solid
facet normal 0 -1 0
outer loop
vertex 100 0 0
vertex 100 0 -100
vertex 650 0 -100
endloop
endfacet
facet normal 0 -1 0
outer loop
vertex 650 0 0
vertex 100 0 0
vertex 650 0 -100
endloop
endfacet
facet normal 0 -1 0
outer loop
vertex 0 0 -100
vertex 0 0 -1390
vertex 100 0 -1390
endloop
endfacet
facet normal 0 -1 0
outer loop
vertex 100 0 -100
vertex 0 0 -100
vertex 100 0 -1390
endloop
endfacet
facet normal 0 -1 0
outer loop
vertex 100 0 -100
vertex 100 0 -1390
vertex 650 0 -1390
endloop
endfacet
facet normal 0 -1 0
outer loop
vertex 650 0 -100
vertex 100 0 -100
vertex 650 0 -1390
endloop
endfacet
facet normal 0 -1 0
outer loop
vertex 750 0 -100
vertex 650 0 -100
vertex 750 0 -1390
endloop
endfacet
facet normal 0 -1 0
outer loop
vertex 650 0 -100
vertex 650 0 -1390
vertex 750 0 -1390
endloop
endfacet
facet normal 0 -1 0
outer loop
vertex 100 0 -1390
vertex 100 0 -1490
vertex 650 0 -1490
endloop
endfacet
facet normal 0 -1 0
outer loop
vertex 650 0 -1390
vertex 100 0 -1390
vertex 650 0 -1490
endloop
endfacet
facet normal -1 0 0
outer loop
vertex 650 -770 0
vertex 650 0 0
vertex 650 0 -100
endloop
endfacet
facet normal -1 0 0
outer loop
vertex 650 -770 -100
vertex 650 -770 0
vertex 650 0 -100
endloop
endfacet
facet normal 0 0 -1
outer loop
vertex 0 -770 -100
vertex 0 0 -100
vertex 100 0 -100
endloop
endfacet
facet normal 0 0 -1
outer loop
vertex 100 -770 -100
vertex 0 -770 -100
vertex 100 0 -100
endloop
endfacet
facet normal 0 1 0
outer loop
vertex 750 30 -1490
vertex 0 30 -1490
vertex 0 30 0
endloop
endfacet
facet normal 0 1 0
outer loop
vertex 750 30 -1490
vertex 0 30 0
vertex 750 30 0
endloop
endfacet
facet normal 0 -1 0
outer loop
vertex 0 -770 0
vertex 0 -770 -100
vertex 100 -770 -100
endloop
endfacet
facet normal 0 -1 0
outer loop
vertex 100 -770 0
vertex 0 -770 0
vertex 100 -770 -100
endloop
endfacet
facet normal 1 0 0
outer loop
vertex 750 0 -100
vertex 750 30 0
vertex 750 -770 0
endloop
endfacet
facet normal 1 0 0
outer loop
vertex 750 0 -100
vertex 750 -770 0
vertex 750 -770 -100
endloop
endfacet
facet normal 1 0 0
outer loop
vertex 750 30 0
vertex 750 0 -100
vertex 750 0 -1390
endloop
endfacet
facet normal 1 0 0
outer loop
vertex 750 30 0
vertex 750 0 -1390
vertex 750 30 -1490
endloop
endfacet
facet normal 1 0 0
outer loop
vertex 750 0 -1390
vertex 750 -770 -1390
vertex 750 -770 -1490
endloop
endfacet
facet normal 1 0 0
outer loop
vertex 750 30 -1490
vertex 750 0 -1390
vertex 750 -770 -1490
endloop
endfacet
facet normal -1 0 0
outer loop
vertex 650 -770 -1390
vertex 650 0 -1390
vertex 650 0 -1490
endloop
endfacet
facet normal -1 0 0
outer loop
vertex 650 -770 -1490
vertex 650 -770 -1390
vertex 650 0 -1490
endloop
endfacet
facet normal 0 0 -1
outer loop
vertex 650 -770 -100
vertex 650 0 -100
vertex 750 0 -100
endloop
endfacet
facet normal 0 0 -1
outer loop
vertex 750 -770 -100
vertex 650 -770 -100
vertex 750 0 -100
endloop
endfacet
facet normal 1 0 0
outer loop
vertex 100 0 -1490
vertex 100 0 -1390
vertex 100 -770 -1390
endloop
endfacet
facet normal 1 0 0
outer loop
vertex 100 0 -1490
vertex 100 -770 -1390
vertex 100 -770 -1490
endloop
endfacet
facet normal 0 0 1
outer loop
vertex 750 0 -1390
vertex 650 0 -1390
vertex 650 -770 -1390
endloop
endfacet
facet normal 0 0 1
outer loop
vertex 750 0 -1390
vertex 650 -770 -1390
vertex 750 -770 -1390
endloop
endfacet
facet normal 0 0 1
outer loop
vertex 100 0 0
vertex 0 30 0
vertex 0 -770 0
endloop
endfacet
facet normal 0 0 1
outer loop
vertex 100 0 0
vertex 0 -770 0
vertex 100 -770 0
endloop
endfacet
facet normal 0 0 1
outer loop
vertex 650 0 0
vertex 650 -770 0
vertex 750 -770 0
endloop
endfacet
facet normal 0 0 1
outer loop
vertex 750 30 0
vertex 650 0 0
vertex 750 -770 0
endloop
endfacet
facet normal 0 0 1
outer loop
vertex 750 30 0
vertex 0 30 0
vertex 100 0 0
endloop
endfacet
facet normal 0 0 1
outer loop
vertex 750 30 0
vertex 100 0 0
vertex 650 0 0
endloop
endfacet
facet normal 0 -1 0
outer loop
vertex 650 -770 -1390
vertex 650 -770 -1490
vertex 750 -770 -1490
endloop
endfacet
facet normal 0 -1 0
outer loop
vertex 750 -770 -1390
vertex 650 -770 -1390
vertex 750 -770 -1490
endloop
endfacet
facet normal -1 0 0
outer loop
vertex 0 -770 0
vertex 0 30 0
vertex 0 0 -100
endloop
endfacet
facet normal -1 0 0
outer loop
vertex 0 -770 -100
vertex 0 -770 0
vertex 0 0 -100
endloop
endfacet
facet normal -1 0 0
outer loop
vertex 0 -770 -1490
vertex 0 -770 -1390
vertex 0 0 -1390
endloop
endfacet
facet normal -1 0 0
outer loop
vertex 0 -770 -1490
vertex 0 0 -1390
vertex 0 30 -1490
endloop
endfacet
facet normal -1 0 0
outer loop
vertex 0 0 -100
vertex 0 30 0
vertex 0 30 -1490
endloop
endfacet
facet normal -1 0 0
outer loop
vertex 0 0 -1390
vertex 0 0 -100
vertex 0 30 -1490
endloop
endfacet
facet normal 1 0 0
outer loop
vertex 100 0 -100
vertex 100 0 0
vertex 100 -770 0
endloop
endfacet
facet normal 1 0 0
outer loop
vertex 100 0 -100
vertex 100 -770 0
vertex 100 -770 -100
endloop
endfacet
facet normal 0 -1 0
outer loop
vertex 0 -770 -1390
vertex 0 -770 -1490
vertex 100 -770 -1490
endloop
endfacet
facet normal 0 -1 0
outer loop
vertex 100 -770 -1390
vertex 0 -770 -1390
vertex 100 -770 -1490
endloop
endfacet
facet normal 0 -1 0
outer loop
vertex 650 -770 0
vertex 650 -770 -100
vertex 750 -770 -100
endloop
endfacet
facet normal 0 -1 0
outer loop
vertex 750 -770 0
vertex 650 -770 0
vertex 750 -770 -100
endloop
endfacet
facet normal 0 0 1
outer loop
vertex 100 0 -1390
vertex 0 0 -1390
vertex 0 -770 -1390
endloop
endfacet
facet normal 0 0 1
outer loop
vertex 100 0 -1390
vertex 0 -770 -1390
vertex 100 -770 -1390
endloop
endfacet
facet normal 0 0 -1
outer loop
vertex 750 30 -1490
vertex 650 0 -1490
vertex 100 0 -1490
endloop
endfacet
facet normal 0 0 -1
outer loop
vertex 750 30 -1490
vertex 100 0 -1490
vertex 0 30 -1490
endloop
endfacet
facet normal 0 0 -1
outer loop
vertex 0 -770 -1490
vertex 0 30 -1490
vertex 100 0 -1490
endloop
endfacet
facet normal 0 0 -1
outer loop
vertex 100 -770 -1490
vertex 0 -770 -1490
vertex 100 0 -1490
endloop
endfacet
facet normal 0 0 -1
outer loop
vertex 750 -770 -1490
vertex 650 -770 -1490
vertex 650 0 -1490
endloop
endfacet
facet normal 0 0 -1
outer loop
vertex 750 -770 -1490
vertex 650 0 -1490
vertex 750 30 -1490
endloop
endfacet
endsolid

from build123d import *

# Parameters (mm, degrees)
SKETCH1_W           = 750
SKETCH1_H           = 1490
BOSS_EXTRUDE1_DEPTH = 30
SKETCH2_W           = 100
SKETCH2_H           = 100
BOSS_EXTRUDE2_DEPTH = 800


with BuildPart() as part:
    # Sketch1 → Boss-Extrude1 (new body)
    with BuildSketch(Plane(origin=(0, 0, 0), x_dir=(1, 0, 0), z_dir=(0, 1, 0))):
        with Locations((375, 745)):
            Rectangle(SKETCH1_W, SKETCH1_H)
    extrude(amount=BOSS_EXTRUDE1_DEPTH)

    # Sketch2 → Boss-Extrude2 (add)
    with BuildSketch(Plane(origin=(0, 30, 0), x_dir=(1, 0, 0), z_dir=(0, 1, 0))):
        with Locations((50, 50)):
            Rectangle(SKETCH2_W, SKETCH2_H)
        with Locations((700, 50)):
            Rectangle(SKETCH2_W, SKETCH2_H)
        with Locations((700, 1440)):
            Rectangle(SKETCH2_W, SKETCH2_H)
        with Locations((50, 1440)):
            Rectangle(SKETCH2_W, SKETCH2_H)
    extrude(amount=-BOSS_EXTRUDE2_DEPTH)


solid = part.part
